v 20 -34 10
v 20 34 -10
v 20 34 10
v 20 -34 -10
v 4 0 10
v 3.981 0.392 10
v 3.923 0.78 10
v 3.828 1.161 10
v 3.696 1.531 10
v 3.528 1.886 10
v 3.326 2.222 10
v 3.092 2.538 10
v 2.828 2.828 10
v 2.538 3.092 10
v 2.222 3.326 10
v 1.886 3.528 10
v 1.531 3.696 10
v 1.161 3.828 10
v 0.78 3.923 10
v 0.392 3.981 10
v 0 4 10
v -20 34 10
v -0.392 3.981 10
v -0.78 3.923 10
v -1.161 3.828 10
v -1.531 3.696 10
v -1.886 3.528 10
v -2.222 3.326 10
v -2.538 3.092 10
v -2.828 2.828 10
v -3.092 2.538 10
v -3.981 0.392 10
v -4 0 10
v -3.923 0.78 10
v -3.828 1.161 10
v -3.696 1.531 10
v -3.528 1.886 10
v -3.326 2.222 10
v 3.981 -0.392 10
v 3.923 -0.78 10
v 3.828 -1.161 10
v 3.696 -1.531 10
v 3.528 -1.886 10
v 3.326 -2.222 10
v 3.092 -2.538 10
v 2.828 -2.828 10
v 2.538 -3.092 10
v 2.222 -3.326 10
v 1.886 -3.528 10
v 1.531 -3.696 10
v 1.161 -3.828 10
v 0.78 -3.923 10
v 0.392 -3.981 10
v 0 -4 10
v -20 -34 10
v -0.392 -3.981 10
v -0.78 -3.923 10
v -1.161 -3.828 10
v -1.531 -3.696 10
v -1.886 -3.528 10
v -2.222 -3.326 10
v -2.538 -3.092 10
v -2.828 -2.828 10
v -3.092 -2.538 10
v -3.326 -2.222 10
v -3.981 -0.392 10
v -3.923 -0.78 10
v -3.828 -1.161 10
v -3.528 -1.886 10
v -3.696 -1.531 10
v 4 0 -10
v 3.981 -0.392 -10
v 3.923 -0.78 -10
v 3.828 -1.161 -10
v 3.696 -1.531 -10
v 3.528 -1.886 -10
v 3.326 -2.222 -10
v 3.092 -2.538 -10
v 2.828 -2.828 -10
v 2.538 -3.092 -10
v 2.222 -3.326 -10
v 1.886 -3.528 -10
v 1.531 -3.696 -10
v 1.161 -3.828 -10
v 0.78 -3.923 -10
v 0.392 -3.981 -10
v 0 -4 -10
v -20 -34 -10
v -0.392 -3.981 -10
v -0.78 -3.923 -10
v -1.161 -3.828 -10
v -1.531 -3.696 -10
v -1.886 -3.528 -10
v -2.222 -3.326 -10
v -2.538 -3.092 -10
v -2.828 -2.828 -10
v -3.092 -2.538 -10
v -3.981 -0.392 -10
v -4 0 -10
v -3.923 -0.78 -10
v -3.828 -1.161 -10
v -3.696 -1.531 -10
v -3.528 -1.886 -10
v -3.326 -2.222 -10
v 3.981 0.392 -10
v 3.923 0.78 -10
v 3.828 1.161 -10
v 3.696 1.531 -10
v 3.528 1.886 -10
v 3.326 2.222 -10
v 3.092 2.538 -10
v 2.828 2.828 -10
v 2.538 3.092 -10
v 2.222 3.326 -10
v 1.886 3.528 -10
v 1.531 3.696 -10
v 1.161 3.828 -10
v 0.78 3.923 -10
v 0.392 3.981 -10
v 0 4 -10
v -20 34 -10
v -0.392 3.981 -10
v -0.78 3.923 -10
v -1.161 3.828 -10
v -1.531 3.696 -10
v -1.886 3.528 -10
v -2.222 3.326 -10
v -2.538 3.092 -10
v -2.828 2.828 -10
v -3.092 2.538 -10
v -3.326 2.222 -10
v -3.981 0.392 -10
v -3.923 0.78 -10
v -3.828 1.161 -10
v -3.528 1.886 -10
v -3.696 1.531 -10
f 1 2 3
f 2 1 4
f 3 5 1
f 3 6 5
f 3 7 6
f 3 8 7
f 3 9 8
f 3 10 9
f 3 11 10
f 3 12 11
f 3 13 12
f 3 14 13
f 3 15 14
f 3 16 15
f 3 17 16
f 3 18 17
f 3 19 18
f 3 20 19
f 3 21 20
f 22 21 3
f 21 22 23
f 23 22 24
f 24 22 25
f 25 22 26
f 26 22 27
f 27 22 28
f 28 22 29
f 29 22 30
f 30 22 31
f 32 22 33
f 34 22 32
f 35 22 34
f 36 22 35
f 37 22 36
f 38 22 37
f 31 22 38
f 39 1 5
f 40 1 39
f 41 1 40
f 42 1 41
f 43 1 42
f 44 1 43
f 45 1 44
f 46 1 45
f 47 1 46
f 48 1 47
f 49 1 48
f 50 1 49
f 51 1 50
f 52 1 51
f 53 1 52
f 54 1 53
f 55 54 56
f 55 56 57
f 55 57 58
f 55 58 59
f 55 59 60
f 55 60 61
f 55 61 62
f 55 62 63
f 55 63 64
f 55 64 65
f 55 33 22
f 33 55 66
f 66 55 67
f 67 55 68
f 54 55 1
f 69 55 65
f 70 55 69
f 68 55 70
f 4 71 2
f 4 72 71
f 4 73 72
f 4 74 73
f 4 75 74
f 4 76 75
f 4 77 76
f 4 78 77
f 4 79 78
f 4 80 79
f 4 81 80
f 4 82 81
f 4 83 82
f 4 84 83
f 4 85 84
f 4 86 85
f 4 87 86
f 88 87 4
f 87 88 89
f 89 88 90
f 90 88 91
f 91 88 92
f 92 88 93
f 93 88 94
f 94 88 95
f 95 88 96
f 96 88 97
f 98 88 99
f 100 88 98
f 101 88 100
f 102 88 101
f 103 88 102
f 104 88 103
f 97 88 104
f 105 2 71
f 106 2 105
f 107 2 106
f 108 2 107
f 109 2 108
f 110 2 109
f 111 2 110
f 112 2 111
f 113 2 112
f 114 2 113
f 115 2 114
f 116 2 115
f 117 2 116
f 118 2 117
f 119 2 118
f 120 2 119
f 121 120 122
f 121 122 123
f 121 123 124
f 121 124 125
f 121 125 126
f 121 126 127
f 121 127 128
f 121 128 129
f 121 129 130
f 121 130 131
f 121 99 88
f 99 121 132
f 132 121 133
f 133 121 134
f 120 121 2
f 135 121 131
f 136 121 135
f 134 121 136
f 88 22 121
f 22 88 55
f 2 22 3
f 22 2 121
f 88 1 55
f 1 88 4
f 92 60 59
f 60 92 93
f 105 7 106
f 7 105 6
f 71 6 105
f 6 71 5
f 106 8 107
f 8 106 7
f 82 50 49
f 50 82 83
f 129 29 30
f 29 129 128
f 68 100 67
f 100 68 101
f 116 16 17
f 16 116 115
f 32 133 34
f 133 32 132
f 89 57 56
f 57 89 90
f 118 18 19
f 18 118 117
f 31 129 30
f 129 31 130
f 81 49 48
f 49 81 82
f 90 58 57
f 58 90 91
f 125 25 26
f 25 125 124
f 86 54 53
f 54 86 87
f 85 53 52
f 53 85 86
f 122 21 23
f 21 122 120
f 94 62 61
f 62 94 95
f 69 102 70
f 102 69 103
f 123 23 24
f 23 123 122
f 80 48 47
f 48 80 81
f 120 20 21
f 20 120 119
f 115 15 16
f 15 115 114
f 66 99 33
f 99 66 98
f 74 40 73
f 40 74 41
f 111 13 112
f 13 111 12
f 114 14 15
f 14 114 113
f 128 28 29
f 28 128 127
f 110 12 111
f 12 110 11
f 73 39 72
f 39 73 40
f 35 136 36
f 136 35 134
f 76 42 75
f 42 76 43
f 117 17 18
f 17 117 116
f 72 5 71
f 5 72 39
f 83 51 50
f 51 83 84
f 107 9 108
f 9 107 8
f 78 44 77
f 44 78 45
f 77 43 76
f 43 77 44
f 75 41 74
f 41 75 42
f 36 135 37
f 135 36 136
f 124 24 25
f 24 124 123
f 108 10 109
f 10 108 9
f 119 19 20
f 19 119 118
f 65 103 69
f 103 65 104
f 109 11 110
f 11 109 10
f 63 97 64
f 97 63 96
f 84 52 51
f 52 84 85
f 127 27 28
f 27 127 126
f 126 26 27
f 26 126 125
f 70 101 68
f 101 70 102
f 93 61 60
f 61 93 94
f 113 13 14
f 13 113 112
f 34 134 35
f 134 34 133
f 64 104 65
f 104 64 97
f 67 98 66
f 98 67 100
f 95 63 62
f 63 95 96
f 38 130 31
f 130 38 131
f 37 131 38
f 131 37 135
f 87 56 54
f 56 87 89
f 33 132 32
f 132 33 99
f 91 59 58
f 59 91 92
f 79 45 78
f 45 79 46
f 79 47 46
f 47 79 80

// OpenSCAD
module linear_bearing_block() {
    difference() {
        // Main block
        cube([40, 68, 20], center = true);
        
        // Shaft hole
        translate([0, 0, 0])
            cylinder(h = 20, d = 8, $fn = 64, center = true);
    }
}

linear_bearing_block();
